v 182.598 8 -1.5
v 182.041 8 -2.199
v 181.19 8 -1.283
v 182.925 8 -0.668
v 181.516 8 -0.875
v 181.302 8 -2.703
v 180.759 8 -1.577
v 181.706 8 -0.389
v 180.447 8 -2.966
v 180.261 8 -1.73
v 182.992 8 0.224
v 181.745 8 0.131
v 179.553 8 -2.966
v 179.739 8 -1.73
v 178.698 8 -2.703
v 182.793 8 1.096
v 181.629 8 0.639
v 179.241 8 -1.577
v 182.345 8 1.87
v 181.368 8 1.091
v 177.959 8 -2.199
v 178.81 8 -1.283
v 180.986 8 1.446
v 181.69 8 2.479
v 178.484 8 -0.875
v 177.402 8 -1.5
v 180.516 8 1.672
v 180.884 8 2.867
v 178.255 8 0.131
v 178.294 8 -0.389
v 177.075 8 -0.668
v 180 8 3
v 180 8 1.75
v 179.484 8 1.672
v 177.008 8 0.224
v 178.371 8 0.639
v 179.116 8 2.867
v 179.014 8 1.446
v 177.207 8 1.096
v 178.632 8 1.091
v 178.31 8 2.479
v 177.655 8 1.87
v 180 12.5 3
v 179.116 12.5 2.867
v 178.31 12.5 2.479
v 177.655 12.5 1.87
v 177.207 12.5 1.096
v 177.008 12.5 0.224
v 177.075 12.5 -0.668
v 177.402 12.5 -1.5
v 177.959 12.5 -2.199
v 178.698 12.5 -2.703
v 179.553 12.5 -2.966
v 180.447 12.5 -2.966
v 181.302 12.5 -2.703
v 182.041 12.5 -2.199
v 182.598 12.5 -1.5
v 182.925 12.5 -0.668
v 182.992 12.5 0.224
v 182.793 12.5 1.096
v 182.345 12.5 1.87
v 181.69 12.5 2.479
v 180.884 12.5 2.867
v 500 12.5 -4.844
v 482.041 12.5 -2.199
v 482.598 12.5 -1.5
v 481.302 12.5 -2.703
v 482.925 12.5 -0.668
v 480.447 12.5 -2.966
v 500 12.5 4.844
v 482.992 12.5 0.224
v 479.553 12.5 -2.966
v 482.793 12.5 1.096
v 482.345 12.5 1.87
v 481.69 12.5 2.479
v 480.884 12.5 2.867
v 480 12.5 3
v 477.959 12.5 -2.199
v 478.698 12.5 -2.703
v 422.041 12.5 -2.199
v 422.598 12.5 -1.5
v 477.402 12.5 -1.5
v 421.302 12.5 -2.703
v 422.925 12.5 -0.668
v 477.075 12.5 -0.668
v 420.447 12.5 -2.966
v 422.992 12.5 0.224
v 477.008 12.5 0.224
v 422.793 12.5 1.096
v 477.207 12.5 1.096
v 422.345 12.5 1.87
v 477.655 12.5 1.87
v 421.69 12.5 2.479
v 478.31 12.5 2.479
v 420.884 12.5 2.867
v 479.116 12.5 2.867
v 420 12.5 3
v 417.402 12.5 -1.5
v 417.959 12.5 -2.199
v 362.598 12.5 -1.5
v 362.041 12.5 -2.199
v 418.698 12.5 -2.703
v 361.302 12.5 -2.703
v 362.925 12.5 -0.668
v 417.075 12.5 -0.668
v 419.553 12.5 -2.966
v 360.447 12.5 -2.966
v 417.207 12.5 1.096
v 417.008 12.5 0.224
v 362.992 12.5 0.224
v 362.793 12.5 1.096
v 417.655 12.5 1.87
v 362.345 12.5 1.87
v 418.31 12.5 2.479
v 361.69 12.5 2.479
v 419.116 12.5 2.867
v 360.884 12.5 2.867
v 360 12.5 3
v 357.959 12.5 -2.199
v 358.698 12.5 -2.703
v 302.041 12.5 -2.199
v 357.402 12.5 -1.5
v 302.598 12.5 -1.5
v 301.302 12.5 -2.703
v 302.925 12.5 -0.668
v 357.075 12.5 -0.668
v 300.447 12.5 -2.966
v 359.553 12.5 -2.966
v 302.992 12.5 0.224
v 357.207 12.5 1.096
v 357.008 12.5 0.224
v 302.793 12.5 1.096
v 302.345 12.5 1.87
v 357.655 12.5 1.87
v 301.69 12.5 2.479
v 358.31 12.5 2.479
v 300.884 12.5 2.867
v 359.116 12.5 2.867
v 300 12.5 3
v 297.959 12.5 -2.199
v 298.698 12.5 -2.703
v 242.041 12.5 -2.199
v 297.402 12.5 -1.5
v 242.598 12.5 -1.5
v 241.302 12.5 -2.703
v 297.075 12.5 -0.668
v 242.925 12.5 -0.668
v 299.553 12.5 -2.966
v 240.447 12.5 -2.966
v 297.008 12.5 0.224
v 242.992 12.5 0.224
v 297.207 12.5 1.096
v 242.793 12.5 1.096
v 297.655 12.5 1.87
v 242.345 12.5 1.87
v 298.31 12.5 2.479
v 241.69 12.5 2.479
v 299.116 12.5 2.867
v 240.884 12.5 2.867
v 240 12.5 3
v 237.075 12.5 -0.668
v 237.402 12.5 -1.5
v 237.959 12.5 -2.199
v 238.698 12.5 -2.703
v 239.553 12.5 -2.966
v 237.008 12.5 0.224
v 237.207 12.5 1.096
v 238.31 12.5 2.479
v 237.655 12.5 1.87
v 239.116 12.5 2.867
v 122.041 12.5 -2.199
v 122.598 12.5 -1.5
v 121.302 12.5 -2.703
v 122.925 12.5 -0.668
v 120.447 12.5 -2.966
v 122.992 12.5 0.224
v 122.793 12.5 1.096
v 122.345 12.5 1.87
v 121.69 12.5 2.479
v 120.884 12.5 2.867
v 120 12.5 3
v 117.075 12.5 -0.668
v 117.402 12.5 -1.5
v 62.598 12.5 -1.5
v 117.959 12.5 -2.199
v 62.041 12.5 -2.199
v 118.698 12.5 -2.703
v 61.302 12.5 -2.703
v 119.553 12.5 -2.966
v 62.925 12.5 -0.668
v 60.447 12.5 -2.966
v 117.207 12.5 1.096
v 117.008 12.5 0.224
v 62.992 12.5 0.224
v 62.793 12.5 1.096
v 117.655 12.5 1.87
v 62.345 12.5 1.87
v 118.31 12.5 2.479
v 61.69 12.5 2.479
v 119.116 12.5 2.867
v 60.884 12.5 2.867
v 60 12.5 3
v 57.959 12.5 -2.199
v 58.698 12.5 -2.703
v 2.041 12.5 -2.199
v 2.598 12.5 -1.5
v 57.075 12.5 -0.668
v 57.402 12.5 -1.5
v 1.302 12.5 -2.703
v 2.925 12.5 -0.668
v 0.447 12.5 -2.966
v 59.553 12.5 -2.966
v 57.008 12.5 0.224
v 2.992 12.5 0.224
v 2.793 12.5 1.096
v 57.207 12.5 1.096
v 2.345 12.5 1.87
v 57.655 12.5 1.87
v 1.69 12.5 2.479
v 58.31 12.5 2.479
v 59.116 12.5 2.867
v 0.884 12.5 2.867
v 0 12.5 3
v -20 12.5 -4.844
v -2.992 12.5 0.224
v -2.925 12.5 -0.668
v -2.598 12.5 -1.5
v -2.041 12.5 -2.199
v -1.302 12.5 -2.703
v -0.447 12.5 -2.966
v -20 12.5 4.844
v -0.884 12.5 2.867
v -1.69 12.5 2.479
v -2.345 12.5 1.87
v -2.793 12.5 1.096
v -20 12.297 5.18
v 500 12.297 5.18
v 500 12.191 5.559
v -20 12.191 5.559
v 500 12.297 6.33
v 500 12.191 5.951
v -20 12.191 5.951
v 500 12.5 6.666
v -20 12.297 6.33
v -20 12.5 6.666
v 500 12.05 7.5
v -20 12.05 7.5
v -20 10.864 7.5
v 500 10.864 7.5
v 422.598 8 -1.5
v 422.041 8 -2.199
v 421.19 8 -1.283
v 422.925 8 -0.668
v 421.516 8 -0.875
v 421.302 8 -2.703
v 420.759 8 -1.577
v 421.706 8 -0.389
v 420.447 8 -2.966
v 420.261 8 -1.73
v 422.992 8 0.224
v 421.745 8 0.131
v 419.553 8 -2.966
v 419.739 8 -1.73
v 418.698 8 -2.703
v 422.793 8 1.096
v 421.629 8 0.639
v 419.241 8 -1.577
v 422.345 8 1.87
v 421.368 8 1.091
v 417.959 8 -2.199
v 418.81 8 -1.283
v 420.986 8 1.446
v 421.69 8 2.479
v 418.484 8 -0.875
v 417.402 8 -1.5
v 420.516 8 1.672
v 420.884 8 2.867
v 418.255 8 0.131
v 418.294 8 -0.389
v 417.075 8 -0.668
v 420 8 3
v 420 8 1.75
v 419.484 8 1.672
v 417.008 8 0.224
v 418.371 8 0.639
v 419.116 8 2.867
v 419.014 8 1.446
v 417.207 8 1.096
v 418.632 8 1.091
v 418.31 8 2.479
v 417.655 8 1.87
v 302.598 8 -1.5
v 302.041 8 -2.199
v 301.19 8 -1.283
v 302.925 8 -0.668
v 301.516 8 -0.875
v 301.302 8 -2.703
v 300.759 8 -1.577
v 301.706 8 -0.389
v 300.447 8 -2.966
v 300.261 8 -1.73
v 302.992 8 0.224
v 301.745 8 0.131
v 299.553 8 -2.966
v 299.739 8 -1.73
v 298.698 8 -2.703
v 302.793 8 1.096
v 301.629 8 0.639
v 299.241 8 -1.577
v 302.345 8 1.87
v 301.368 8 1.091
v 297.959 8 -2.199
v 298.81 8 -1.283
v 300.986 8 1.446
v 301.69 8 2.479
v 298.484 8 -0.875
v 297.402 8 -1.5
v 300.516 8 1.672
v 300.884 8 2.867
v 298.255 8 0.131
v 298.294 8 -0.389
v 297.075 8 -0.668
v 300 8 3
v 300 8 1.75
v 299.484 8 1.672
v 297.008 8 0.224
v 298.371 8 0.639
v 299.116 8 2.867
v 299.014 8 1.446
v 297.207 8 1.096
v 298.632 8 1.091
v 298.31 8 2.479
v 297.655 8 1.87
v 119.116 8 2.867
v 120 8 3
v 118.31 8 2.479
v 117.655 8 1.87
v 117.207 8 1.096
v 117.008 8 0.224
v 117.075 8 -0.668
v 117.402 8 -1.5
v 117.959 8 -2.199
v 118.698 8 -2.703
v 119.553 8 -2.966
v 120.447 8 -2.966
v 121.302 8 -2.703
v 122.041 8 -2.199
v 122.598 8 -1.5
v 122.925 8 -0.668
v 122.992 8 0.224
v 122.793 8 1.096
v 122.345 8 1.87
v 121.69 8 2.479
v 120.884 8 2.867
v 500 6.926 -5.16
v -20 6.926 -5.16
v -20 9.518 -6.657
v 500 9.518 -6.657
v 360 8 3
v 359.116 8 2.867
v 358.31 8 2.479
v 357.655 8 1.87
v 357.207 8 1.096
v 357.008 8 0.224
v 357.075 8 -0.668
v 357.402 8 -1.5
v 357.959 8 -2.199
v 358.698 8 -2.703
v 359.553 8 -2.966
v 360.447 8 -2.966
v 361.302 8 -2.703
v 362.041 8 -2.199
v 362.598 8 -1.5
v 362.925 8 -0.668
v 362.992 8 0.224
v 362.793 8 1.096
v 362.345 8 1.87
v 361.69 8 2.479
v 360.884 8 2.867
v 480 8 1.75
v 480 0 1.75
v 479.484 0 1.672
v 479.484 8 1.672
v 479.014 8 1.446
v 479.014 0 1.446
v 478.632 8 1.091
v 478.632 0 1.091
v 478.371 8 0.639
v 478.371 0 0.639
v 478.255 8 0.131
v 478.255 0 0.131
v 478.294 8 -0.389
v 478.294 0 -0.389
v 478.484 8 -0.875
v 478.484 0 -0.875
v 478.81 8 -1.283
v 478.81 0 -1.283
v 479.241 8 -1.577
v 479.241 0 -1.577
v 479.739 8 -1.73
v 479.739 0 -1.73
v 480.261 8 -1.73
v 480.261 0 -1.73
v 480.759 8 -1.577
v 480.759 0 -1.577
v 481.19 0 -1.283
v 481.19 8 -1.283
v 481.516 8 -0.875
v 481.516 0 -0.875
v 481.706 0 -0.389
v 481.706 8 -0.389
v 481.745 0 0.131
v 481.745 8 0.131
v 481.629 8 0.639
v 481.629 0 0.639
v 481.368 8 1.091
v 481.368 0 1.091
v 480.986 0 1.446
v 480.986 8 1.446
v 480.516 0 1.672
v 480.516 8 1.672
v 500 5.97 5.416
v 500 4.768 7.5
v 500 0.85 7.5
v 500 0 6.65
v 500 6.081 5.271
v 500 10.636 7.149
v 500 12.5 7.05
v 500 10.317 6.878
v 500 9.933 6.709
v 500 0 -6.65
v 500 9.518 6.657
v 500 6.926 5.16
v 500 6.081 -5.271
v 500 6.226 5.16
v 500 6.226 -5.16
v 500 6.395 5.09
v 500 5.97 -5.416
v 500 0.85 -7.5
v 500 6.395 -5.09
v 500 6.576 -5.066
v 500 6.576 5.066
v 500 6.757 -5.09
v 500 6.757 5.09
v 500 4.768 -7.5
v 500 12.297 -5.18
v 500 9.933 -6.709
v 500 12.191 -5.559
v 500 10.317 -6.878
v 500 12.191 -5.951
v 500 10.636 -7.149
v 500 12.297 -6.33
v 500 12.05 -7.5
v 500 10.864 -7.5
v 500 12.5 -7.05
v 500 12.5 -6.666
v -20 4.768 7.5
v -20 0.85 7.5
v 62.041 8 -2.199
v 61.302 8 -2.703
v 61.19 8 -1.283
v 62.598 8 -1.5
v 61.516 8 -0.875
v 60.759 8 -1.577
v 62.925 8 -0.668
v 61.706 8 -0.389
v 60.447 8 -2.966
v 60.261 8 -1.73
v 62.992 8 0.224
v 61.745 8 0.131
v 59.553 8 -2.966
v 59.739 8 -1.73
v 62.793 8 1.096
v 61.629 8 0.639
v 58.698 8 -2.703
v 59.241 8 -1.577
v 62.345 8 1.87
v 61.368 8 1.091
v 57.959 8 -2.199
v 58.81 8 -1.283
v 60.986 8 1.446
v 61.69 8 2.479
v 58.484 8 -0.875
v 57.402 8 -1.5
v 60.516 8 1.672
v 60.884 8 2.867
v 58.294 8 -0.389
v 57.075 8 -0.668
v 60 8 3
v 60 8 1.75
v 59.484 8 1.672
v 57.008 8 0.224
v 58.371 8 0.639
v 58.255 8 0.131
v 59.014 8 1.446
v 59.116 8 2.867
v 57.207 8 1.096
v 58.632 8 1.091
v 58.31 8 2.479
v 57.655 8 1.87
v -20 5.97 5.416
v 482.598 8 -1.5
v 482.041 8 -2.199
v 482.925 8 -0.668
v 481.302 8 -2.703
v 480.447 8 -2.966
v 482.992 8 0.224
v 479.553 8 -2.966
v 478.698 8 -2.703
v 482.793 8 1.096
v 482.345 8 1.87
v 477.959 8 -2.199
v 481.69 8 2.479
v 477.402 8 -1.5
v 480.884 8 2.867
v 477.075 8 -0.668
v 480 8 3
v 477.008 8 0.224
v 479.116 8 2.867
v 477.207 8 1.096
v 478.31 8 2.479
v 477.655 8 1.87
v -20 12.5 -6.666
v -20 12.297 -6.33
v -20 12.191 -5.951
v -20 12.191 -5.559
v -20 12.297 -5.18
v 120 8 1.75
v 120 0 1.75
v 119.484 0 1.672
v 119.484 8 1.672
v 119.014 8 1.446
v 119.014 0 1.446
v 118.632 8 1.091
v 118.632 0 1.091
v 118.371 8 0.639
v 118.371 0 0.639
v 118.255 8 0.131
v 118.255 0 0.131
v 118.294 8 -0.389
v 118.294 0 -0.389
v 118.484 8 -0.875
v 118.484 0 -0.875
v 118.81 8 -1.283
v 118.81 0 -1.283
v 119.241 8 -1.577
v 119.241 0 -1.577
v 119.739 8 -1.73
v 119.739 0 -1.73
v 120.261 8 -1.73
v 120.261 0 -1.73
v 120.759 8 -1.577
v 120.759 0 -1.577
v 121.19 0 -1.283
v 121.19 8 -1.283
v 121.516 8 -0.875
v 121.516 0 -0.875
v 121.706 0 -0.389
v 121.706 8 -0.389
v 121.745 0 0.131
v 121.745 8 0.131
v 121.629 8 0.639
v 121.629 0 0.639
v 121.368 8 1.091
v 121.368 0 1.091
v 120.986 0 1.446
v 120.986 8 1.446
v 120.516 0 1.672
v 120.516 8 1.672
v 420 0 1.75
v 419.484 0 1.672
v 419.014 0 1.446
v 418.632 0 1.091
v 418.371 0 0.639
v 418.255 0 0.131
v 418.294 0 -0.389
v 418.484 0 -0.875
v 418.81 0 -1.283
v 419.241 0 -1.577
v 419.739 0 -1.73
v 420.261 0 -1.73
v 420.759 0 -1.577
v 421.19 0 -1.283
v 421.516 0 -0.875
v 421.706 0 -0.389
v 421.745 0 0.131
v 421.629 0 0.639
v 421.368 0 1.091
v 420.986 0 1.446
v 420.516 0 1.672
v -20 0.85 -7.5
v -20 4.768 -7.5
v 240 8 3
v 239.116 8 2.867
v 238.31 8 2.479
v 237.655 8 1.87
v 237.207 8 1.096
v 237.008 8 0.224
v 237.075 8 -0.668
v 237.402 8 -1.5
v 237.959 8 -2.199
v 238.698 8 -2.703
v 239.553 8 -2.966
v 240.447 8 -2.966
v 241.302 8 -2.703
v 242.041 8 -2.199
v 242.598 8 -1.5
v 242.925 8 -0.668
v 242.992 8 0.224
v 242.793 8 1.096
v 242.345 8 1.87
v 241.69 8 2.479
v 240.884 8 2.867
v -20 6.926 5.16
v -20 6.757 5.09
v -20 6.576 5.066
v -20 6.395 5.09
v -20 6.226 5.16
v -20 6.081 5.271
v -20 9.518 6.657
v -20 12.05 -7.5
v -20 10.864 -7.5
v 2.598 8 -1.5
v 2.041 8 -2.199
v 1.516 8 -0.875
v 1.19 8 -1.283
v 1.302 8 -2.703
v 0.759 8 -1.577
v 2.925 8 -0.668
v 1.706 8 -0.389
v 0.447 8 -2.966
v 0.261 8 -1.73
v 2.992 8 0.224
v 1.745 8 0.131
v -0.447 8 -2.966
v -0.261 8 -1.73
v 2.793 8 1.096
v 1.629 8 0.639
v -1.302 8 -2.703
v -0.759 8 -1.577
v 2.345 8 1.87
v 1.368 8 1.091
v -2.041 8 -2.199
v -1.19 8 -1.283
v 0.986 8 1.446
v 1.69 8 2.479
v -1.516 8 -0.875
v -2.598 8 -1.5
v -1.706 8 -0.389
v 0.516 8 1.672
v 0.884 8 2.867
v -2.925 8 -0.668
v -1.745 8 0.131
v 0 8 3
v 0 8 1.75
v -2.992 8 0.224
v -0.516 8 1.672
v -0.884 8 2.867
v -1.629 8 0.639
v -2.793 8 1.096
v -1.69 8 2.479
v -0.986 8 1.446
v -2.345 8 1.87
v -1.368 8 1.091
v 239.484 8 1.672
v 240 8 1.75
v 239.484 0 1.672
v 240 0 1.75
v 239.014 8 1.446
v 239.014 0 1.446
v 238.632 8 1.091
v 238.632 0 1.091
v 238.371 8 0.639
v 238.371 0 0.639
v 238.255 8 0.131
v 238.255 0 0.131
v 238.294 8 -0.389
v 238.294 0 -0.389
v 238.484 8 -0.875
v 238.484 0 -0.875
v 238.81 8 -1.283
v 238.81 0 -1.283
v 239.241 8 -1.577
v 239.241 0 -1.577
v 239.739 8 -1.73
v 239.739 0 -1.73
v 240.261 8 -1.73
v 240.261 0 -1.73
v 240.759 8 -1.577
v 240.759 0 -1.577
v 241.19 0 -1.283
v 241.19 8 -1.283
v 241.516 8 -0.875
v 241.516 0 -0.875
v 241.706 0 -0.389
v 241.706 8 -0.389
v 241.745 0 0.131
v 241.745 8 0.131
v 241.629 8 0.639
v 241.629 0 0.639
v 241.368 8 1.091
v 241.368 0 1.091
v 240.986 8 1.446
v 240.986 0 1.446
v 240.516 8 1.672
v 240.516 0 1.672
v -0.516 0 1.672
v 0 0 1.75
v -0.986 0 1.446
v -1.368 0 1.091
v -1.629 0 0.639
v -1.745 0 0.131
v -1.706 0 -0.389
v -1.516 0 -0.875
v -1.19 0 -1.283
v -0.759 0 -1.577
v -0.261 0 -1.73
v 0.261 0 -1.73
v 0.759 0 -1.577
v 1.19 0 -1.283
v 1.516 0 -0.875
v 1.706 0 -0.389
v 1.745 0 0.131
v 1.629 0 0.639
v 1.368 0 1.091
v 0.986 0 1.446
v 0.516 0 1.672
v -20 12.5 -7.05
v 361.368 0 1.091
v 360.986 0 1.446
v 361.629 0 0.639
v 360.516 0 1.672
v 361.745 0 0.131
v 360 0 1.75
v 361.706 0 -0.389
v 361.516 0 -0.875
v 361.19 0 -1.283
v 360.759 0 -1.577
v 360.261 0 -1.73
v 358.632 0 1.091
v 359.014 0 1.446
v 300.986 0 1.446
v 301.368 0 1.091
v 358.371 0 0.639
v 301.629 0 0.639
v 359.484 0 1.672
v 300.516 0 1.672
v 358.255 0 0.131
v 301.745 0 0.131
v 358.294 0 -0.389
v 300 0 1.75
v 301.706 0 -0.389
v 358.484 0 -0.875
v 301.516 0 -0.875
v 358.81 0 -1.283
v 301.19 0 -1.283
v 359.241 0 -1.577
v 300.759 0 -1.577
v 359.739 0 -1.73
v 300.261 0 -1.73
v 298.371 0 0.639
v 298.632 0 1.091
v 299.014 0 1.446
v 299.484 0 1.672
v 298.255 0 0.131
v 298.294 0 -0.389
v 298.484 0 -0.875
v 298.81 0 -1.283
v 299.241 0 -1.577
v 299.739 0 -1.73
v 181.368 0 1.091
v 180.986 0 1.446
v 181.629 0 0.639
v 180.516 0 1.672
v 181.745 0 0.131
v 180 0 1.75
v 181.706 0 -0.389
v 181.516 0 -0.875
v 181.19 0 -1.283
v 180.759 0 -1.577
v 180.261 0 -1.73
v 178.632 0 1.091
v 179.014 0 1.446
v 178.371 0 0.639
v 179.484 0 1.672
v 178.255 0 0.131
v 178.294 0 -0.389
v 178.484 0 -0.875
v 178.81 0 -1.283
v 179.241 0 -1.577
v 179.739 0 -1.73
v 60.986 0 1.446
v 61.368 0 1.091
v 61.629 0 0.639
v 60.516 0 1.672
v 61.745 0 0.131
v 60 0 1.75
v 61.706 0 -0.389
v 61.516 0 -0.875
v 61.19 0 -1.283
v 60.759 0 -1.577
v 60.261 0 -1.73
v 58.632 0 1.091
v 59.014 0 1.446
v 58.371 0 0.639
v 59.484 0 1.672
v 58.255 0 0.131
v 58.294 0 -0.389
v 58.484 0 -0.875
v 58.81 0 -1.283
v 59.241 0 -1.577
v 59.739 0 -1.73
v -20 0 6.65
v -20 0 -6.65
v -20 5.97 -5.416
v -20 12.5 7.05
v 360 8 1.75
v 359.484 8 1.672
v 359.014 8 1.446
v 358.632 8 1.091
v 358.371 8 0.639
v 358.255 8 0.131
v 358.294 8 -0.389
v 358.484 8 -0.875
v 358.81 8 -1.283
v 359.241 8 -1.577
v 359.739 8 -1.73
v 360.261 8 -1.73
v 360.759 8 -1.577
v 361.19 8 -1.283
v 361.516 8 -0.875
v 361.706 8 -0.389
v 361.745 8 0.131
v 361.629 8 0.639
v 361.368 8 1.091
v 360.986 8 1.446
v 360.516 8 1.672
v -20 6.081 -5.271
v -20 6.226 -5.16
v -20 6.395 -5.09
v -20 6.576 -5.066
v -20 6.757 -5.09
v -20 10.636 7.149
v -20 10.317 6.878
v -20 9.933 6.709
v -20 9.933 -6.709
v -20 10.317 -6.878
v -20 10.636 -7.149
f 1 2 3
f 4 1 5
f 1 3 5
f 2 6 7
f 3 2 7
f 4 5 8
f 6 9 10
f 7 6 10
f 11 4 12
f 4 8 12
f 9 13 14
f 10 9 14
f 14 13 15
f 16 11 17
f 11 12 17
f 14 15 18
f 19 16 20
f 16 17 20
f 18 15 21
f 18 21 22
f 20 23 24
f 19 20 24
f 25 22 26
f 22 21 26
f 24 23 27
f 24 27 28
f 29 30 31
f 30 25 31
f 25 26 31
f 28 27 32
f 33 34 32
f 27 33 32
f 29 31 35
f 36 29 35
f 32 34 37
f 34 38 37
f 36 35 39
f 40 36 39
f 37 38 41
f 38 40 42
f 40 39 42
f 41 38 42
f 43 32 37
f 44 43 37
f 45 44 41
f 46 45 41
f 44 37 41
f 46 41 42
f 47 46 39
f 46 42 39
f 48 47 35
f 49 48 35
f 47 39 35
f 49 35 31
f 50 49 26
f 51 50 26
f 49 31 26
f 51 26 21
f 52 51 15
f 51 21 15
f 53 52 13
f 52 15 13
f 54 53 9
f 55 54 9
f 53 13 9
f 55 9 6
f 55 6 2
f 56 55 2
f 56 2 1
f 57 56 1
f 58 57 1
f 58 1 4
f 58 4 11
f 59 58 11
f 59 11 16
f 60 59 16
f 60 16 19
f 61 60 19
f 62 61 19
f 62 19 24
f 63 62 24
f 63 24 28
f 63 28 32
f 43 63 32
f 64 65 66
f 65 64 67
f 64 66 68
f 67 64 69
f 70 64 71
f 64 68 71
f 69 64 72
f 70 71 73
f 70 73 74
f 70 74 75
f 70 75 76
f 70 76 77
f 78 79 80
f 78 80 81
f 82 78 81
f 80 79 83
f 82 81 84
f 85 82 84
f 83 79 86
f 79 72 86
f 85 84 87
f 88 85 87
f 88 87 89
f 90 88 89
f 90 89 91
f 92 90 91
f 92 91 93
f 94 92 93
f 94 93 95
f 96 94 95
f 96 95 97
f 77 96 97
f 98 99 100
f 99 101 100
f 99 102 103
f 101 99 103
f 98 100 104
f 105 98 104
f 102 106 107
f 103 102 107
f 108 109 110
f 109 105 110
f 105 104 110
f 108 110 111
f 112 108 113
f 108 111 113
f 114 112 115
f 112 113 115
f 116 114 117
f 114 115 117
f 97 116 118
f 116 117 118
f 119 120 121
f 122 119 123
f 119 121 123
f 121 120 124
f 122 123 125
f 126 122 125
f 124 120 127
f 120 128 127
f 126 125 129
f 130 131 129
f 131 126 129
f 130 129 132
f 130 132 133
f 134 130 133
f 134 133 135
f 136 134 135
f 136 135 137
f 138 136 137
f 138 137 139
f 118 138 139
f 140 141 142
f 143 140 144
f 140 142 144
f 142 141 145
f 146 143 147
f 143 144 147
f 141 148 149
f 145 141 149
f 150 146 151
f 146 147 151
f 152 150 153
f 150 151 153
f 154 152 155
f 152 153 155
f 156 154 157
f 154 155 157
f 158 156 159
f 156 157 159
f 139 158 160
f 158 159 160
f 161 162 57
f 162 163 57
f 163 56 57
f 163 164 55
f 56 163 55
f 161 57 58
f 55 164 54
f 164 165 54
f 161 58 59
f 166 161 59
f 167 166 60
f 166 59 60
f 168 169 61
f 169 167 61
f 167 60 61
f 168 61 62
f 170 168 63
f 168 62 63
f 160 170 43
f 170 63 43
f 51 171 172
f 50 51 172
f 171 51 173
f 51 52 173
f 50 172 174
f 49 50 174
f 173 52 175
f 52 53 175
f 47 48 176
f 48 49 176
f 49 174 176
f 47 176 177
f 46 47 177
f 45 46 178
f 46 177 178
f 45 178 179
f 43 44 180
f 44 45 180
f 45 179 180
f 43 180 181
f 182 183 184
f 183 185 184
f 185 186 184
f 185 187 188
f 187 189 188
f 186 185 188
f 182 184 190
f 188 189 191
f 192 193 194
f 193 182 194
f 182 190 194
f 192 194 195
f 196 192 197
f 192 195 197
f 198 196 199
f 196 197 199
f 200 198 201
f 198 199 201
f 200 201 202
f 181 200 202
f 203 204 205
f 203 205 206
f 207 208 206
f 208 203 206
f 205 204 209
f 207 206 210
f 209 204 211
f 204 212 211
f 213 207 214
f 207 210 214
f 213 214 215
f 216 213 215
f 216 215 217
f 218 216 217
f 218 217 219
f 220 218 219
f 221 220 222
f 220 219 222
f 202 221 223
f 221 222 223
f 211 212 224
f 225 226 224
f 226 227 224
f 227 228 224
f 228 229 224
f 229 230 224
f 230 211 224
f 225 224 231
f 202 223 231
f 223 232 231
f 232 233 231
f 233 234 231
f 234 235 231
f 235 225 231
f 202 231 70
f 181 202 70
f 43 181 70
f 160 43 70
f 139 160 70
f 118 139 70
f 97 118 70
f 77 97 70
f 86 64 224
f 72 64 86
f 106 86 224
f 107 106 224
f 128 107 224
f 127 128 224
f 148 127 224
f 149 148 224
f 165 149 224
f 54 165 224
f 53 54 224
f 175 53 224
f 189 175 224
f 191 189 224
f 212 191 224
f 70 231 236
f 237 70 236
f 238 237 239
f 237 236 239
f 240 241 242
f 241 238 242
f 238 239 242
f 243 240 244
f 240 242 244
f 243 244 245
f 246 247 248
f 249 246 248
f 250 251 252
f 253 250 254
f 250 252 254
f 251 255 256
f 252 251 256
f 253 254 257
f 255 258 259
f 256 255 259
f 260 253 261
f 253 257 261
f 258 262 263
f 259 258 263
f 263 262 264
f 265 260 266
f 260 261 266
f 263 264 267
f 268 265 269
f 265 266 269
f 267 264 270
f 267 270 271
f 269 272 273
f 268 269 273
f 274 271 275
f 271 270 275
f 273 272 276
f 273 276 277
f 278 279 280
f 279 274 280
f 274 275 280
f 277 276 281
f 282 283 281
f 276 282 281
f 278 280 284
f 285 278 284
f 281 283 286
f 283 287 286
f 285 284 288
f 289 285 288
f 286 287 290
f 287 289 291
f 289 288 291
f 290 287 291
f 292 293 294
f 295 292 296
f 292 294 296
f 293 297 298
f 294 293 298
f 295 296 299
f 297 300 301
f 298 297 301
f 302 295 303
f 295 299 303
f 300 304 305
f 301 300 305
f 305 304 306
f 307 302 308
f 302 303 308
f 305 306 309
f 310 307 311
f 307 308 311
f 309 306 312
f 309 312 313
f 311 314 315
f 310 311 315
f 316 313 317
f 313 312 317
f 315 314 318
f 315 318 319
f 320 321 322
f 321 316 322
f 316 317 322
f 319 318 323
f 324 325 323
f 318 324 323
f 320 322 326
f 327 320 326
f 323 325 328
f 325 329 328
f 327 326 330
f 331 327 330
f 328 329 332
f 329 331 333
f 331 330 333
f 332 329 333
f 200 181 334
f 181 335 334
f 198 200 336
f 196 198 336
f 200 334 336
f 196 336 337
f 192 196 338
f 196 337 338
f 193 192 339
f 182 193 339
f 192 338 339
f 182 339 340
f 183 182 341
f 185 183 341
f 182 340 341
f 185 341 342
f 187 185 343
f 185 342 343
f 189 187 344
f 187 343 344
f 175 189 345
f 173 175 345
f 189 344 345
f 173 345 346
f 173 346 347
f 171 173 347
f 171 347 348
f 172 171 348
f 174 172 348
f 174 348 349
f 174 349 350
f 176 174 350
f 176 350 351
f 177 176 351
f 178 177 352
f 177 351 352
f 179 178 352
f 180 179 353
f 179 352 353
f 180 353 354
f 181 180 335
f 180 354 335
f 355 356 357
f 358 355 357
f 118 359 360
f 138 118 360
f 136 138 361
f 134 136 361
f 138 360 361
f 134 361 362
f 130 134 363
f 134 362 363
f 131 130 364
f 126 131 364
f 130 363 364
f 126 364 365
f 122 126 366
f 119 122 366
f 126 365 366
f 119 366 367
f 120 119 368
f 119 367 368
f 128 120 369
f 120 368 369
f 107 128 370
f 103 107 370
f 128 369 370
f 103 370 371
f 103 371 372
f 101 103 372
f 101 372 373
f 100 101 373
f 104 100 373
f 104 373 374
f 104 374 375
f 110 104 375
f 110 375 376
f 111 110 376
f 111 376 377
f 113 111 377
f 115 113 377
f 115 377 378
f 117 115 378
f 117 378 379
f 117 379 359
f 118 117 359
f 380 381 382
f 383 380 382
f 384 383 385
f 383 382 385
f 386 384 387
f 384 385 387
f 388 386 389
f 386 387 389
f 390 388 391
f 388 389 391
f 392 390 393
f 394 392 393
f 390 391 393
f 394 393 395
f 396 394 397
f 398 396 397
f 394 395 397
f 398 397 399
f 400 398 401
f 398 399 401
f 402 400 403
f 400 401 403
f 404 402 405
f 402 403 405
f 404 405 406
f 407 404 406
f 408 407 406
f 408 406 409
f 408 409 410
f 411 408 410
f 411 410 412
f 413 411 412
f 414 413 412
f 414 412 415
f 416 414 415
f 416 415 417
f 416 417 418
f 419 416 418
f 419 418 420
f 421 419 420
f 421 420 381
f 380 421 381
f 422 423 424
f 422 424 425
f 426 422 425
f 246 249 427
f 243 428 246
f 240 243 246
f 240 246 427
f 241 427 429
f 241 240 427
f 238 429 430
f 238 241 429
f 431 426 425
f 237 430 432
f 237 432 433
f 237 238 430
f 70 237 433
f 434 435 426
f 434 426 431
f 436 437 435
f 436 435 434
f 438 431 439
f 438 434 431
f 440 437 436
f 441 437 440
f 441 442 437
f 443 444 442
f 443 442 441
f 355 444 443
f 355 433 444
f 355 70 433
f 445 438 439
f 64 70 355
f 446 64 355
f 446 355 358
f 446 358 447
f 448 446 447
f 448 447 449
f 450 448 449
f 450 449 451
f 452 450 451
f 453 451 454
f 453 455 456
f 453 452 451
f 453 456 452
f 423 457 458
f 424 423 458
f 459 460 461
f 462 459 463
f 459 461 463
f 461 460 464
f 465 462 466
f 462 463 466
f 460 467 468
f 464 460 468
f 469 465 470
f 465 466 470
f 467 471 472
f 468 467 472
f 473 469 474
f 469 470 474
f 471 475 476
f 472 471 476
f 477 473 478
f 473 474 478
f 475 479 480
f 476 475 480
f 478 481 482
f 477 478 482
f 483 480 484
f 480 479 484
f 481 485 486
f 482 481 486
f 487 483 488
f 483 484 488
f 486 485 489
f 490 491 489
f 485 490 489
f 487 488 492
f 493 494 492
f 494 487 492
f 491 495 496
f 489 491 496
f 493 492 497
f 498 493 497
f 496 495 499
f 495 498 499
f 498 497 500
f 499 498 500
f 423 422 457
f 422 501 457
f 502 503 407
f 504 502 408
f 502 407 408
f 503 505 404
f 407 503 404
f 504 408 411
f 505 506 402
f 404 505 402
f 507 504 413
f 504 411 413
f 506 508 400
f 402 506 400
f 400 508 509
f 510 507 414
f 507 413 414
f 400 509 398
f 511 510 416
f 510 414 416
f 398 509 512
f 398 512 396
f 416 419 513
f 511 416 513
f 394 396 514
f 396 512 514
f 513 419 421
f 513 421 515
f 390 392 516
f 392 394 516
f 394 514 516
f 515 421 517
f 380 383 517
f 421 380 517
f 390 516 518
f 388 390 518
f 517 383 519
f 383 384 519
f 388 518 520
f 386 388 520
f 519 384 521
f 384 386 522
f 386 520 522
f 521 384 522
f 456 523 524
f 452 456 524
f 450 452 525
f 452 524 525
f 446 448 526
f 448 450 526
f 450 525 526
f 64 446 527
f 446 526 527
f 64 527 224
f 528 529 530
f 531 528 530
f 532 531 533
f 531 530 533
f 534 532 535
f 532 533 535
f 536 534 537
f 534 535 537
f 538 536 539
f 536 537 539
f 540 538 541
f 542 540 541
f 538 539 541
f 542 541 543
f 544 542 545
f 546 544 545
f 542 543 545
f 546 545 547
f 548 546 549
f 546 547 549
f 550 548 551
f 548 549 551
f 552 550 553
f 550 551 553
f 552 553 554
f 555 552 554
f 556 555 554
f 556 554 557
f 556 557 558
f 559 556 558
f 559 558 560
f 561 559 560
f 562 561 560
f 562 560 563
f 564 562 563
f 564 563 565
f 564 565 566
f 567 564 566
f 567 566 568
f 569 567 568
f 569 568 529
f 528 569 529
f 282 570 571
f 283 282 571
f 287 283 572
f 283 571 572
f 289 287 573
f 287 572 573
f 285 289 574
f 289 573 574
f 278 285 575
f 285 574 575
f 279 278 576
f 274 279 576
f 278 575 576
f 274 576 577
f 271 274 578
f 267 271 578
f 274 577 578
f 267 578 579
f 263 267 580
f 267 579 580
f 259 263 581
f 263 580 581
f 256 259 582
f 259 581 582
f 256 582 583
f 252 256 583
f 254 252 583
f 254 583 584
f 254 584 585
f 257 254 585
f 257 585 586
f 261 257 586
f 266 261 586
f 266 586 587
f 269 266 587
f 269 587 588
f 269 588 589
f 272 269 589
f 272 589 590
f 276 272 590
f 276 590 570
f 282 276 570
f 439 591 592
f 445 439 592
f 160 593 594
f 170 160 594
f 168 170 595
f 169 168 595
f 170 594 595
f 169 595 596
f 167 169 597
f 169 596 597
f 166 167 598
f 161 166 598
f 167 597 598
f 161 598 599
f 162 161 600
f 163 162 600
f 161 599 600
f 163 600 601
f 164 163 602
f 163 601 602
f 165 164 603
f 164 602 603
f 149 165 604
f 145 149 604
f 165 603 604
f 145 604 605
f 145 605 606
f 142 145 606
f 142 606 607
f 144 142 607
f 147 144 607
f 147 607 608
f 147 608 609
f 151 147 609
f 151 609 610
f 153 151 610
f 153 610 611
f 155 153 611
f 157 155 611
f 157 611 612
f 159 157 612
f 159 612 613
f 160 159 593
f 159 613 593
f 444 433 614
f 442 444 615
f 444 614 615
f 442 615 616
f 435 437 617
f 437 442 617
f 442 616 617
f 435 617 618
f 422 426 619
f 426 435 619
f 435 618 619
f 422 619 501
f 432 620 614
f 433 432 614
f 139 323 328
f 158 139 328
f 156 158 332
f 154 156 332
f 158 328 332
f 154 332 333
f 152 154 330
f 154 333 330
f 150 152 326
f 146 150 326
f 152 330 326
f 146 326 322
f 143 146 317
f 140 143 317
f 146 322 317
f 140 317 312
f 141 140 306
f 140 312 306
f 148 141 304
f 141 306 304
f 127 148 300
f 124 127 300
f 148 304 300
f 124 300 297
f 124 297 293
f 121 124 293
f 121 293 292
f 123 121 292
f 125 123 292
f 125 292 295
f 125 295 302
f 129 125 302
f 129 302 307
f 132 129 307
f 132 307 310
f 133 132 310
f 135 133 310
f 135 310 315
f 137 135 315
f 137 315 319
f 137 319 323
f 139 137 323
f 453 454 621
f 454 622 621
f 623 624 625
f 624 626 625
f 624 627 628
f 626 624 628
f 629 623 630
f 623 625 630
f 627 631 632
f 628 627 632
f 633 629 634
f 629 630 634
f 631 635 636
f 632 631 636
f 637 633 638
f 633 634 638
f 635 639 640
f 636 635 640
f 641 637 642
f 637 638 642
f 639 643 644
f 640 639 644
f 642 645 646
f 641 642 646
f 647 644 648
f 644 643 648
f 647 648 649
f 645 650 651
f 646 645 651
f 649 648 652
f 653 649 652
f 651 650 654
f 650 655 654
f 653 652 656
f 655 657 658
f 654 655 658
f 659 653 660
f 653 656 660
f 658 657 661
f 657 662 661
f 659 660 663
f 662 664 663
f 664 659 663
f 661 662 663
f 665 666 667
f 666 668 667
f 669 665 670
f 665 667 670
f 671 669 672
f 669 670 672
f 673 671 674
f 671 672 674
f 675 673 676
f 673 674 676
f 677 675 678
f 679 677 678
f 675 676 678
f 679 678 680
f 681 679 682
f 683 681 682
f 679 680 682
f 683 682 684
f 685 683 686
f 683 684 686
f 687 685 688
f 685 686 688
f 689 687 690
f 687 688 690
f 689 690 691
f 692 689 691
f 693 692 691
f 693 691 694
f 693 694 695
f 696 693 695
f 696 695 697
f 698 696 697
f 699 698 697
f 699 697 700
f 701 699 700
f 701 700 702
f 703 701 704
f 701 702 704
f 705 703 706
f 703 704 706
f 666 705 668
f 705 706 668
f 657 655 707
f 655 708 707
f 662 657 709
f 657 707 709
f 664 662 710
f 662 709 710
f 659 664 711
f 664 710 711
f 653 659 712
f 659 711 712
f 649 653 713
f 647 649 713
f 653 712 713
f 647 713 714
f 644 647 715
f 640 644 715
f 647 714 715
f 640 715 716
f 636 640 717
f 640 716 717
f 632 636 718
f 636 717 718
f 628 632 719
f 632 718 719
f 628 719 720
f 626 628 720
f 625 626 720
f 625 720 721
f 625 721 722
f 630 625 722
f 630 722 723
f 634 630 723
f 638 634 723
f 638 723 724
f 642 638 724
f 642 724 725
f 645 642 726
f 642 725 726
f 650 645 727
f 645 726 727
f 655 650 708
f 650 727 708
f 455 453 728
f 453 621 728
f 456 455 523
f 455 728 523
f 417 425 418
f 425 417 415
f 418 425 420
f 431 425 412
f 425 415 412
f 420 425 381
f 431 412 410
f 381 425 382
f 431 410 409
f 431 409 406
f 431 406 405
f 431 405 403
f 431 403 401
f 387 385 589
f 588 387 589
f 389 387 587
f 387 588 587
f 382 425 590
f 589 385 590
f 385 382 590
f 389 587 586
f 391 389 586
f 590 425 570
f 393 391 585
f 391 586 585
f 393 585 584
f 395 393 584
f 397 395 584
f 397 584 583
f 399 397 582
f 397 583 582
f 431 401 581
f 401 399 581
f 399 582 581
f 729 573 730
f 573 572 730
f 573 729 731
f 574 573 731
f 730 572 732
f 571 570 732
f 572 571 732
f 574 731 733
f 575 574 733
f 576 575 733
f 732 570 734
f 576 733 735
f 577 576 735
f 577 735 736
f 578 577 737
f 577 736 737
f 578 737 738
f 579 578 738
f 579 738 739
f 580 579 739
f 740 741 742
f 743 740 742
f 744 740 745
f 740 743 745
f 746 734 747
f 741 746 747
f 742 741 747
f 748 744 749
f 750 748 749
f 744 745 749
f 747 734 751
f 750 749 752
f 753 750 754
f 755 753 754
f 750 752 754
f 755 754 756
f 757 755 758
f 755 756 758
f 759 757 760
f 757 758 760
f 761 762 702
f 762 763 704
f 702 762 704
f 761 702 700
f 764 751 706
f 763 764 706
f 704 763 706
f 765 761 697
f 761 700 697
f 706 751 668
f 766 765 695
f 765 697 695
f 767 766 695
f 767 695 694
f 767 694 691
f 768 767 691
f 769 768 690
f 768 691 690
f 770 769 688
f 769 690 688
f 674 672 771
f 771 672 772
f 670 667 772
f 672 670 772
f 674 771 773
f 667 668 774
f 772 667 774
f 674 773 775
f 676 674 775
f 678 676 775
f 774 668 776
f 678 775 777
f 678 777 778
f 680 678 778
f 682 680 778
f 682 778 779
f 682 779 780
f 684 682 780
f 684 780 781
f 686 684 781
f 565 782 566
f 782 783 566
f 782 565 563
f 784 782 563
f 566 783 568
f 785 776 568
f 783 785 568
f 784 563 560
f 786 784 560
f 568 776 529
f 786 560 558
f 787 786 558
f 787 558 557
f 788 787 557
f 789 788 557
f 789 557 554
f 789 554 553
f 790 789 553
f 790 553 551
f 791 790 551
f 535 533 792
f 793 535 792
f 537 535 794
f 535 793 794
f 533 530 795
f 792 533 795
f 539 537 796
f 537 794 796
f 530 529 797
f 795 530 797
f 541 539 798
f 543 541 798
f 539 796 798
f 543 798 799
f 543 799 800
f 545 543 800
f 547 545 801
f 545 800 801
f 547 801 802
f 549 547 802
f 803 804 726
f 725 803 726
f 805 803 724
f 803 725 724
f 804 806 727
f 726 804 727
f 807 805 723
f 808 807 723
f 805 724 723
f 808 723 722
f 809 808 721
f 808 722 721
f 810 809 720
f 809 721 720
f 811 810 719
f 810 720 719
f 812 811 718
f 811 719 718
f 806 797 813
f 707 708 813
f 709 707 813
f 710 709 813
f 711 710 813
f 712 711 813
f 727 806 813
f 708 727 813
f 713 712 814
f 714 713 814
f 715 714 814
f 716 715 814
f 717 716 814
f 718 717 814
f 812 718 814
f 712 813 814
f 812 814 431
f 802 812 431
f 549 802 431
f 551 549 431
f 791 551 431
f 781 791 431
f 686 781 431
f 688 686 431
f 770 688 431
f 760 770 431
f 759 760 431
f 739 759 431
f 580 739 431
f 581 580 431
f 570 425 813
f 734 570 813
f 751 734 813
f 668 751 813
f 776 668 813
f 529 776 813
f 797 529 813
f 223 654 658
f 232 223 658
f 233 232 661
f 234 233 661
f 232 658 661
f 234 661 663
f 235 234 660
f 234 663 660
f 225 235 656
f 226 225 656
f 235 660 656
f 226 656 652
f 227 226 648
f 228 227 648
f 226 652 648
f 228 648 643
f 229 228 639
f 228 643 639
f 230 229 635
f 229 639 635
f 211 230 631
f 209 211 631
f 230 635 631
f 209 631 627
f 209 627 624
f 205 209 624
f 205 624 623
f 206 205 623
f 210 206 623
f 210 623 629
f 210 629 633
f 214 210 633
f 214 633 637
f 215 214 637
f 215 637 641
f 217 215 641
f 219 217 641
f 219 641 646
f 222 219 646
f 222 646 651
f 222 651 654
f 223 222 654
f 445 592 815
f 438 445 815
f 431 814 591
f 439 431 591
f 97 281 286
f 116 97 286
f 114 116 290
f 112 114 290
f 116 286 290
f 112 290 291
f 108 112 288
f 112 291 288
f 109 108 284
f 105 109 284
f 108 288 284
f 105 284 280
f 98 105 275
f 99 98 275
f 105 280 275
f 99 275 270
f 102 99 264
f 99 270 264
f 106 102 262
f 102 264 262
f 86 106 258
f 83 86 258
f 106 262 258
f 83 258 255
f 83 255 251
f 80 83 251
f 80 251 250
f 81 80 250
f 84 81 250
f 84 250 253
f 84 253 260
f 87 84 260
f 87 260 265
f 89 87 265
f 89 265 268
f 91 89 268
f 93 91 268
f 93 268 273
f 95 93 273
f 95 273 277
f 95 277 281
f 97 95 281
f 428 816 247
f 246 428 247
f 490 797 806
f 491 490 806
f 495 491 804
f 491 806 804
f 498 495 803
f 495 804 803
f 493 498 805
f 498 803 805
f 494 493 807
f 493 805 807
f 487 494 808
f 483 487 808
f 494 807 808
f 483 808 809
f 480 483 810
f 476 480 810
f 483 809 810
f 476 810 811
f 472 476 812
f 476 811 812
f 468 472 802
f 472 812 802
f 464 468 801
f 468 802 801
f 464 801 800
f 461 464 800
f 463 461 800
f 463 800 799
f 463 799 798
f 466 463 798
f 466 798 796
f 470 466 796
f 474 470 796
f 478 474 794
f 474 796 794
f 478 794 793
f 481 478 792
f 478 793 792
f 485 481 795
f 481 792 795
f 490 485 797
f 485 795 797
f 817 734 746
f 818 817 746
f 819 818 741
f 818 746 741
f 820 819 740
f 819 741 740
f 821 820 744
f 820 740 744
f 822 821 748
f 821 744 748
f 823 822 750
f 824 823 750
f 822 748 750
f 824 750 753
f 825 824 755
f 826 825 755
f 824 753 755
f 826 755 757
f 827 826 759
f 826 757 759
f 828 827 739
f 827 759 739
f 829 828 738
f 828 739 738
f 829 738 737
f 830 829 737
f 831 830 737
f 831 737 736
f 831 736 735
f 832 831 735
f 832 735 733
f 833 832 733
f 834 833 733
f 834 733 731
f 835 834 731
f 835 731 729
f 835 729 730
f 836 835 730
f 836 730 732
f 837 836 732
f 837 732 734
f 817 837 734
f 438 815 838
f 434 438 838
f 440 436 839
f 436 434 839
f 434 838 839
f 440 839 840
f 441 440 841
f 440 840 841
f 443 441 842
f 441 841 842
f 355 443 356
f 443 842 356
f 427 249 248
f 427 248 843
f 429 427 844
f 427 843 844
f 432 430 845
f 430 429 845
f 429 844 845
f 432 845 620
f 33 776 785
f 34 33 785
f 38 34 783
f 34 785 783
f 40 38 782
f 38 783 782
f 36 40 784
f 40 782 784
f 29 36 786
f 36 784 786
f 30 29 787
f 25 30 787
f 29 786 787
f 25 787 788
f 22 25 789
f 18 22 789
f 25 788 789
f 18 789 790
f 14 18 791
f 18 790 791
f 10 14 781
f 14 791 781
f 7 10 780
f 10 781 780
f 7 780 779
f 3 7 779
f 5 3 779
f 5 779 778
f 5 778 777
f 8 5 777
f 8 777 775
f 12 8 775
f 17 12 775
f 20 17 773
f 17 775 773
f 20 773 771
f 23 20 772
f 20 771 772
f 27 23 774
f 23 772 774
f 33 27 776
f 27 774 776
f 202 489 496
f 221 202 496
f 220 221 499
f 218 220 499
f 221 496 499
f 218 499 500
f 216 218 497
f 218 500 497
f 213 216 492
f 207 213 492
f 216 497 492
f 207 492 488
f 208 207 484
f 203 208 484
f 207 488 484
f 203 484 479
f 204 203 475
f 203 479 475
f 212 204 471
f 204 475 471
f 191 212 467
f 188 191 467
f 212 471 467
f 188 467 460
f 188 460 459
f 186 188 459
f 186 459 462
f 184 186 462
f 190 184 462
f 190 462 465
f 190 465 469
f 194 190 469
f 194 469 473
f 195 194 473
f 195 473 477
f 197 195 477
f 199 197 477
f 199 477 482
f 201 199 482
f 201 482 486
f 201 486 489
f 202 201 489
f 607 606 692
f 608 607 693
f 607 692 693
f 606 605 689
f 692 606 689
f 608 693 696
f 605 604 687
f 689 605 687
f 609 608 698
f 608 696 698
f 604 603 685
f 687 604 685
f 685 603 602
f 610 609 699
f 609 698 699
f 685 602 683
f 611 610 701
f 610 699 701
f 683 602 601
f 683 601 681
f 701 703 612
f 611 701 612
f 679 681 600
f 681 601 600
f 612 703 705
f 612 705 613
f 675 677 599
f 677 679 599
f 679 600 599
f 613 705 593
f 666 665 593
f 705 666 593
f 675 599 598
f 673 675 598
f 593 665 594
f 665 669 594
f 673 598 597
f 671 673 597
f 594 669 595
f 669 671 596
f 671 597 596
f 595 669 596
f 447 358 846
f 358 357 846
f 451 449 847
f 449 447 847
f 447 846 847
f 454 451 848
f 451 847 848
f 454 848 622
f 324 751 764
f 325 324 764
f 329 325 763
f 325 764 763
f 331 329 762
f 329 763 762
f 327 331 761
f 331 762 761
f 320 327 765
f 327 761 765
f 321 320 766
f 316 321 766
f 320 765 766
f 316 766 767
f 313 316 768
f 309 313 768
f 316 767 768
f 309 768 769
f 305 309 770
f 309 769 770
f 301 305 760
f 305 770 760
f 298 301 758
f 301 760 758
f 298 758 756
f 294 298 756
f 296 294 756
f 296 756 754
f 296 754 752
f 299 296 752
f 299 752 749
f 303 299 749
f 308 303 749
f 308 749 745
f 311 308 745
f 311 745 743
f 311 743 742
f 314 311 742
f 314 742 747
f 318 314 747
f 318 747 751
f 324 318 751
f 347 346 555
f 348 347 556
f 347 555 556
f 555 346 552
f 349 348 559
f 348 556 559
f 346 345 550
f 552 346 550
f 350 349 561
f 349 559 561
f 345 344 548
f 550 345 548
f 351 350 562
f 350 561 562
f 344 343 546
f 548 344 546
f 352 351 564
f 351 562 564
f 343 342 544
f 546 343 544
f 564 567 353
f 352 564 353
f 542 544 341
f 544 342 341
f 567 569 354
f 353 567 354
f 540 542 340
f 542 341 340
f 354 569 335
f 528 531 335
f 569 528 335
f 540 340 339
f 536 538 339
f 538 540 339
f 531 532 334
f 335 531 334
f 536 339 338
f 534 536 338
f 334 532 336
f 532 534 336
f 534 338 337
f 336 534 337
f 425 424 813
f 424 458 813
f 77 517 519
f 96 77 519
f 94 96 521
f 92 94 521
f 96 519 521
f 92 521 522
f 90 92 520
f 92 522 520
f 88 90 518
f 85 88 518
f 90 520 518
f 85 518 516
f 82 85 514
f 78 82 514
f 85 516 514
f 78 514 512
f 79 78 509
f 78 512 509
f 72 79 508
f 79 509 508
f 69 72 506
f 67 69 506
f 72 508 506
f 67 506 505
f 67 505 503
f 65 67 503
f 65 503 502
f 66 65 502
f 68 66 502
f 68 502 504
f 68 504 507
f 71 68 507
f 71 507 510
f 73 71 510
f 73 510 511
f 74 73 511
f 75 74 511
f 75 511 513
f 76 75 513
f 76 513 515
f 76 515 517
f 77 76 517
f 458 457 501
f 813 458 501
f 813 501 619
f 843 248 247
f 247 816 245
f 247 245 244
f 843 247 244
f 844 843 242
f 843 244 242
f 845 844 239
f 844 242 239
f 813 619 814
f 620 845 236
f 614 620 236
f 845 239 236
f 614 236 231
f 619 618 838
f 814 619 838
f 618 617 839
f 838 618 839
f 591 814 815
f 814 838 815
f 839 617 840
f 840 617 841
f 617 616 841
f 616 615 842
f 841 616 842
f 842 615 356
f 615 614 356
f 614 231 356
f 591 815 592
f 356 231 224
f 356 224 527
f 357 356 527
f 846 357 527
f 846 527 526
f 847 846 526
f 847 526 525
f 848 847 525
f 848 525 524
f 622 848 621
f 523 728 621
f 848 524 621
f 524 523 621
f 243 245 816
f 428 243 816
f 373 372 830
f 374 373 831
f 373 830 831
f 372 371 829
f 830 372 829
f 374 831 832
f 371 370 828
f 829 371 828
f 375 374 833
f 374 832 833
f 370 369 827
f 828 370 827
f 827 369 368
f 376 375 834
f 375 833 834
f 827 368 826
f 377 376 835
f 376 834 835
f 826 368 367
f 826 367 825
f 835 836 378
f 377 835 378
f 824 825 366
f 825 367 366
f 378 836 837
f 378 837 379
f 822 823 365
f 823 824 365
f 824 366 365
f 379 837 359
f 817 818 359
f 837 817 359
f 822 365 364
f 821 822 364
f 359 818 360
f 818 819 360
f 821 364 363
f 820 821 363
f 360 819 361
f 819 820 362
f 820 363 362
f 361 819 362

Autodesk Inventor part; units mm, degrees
sketch "Sketch_15" plane through (-20, 0, 0) normal (1, 0, 0) x (0, 0, -1)
  line L0 (-7.5, 0.85) -> (-6.65, 0)
  line L1 (-6.65, 0) -> (6.65, 0)
  line L2 (6.65, 0) -> (7.5, 0.85)
  line L3 (7.5, 0.85) -> (7.5, 4.768)
  line L4 (7.5, 4.768) -> (5.4163, 5.9696)
  arc A0 (5.1599, 6.9262) -> (5.4163, 5.9696) centre (5.766, 6.576) ccw
  line L5 (5.1599, 6.9262) -> (6.6573, 9.518)
  arc A1 (7.5, 10.8638) -> (6.6573, 9.518) centre (8.107, 9.547) ccw
  line L6 (7.5, 10.8638) -> (7.5, 12.05)
  line L7 (7.5, 12.05) -> (7.05, 12.5)
  line L8 (7.05, 12.5) -> (6.6661, 12.5)
  arc A2 (4.8439, 12.5) -> (6.6661, 12.5) centre (5.755, 13.628) ccw
  line L9 (4.8439, 12.5) -> (-4.8439, 12.5)
  arc A3 (-6.6661, 12.5) -> (-4.8439, 12.5) centre (-5.755, 13.628) ccw
  line L10 (-6.6661, 12.5) -> (-7.05, 12.5)
  line L11 (-7.05, 12.5) -> (-7.5, 12.05)
  line L12 (-7.5, 12.05) -> (-7.5, 10.8638)
  arc A4 (-6.6573, 9.518) -> (-7.5, 10.8638) centre (-8.107, 9.547) ccw
  line L13 (-6.6573, 9.518) -> (-5.1599, 6.9262)
  arc A5 (-5.4163, 5.9696) -> (-5.1599, 6.9262) centre (-5.766, 6.576) ccw
  line L14 (-5.4163, 5.9696) -> (-7.5, 4.768)
  line L15 (-7.5, 4.768) -> (-7.5, 0.85)
extrude "Extrusion1" add sketch "Sketch_15" along normal blind 520
sketch "Sketch2" plane through (-20, 12.5, -4.8439) normal (0, 1, 0) x (1, 0, 0)
  point P0 (20, -4.8439)
hole "Hole1" at (0, 12.5, 0) direction (0, -1, 0) diameter 3.5 depth 12.5 counterbore diameter 6 counterbore depth 4.5
pattern_linear "Rectangular Pattern1" count 9 spacing 60 along (1, 0, 0) of "Hole1"
ref_plane "4DUMMY_XY" through (0, 0, 0) normal (1, 0, 0) x (0, 0, -1)
ref_plane "4DUMMY_YZ" through (0, 0, 0) normal (0, 0, -1) x (0, 1, 0)
ref_plane "4DUMMY_ZX" through (0, 0, 0) normal (0, 1, 0) x (1, 0, 0)
ref_plane "4SLIDE_XY" through (-20, 4.5, 0) normal (1, 0, 0) x (0, 0, -1)
ref_plane "4SLIDE_YZ" through (-20, 4.5, 0) normal (0, 0, -1) x (0, 1, 0)
ref_plane "4SLIDE_ZX" through (-20, 4.5, 0) normal (0, 1, 0) x (1, 0, 0)
ref_plane "4TRACK_XY" through (0, 0, 0) normal (0, 0, 1) x (1, 0, 0)
ref_plane "4TRACK_YZ" through (0, 0, 0) normal (1, 0, 0) x (0, 1, 0)
ref_plane "4TRACK_ZX" through (0, 0, 0) normal (0, 1, 0) x (0, 0, 1)
properties part number "SR15W52020 Track" material "Steel, Alloy"
